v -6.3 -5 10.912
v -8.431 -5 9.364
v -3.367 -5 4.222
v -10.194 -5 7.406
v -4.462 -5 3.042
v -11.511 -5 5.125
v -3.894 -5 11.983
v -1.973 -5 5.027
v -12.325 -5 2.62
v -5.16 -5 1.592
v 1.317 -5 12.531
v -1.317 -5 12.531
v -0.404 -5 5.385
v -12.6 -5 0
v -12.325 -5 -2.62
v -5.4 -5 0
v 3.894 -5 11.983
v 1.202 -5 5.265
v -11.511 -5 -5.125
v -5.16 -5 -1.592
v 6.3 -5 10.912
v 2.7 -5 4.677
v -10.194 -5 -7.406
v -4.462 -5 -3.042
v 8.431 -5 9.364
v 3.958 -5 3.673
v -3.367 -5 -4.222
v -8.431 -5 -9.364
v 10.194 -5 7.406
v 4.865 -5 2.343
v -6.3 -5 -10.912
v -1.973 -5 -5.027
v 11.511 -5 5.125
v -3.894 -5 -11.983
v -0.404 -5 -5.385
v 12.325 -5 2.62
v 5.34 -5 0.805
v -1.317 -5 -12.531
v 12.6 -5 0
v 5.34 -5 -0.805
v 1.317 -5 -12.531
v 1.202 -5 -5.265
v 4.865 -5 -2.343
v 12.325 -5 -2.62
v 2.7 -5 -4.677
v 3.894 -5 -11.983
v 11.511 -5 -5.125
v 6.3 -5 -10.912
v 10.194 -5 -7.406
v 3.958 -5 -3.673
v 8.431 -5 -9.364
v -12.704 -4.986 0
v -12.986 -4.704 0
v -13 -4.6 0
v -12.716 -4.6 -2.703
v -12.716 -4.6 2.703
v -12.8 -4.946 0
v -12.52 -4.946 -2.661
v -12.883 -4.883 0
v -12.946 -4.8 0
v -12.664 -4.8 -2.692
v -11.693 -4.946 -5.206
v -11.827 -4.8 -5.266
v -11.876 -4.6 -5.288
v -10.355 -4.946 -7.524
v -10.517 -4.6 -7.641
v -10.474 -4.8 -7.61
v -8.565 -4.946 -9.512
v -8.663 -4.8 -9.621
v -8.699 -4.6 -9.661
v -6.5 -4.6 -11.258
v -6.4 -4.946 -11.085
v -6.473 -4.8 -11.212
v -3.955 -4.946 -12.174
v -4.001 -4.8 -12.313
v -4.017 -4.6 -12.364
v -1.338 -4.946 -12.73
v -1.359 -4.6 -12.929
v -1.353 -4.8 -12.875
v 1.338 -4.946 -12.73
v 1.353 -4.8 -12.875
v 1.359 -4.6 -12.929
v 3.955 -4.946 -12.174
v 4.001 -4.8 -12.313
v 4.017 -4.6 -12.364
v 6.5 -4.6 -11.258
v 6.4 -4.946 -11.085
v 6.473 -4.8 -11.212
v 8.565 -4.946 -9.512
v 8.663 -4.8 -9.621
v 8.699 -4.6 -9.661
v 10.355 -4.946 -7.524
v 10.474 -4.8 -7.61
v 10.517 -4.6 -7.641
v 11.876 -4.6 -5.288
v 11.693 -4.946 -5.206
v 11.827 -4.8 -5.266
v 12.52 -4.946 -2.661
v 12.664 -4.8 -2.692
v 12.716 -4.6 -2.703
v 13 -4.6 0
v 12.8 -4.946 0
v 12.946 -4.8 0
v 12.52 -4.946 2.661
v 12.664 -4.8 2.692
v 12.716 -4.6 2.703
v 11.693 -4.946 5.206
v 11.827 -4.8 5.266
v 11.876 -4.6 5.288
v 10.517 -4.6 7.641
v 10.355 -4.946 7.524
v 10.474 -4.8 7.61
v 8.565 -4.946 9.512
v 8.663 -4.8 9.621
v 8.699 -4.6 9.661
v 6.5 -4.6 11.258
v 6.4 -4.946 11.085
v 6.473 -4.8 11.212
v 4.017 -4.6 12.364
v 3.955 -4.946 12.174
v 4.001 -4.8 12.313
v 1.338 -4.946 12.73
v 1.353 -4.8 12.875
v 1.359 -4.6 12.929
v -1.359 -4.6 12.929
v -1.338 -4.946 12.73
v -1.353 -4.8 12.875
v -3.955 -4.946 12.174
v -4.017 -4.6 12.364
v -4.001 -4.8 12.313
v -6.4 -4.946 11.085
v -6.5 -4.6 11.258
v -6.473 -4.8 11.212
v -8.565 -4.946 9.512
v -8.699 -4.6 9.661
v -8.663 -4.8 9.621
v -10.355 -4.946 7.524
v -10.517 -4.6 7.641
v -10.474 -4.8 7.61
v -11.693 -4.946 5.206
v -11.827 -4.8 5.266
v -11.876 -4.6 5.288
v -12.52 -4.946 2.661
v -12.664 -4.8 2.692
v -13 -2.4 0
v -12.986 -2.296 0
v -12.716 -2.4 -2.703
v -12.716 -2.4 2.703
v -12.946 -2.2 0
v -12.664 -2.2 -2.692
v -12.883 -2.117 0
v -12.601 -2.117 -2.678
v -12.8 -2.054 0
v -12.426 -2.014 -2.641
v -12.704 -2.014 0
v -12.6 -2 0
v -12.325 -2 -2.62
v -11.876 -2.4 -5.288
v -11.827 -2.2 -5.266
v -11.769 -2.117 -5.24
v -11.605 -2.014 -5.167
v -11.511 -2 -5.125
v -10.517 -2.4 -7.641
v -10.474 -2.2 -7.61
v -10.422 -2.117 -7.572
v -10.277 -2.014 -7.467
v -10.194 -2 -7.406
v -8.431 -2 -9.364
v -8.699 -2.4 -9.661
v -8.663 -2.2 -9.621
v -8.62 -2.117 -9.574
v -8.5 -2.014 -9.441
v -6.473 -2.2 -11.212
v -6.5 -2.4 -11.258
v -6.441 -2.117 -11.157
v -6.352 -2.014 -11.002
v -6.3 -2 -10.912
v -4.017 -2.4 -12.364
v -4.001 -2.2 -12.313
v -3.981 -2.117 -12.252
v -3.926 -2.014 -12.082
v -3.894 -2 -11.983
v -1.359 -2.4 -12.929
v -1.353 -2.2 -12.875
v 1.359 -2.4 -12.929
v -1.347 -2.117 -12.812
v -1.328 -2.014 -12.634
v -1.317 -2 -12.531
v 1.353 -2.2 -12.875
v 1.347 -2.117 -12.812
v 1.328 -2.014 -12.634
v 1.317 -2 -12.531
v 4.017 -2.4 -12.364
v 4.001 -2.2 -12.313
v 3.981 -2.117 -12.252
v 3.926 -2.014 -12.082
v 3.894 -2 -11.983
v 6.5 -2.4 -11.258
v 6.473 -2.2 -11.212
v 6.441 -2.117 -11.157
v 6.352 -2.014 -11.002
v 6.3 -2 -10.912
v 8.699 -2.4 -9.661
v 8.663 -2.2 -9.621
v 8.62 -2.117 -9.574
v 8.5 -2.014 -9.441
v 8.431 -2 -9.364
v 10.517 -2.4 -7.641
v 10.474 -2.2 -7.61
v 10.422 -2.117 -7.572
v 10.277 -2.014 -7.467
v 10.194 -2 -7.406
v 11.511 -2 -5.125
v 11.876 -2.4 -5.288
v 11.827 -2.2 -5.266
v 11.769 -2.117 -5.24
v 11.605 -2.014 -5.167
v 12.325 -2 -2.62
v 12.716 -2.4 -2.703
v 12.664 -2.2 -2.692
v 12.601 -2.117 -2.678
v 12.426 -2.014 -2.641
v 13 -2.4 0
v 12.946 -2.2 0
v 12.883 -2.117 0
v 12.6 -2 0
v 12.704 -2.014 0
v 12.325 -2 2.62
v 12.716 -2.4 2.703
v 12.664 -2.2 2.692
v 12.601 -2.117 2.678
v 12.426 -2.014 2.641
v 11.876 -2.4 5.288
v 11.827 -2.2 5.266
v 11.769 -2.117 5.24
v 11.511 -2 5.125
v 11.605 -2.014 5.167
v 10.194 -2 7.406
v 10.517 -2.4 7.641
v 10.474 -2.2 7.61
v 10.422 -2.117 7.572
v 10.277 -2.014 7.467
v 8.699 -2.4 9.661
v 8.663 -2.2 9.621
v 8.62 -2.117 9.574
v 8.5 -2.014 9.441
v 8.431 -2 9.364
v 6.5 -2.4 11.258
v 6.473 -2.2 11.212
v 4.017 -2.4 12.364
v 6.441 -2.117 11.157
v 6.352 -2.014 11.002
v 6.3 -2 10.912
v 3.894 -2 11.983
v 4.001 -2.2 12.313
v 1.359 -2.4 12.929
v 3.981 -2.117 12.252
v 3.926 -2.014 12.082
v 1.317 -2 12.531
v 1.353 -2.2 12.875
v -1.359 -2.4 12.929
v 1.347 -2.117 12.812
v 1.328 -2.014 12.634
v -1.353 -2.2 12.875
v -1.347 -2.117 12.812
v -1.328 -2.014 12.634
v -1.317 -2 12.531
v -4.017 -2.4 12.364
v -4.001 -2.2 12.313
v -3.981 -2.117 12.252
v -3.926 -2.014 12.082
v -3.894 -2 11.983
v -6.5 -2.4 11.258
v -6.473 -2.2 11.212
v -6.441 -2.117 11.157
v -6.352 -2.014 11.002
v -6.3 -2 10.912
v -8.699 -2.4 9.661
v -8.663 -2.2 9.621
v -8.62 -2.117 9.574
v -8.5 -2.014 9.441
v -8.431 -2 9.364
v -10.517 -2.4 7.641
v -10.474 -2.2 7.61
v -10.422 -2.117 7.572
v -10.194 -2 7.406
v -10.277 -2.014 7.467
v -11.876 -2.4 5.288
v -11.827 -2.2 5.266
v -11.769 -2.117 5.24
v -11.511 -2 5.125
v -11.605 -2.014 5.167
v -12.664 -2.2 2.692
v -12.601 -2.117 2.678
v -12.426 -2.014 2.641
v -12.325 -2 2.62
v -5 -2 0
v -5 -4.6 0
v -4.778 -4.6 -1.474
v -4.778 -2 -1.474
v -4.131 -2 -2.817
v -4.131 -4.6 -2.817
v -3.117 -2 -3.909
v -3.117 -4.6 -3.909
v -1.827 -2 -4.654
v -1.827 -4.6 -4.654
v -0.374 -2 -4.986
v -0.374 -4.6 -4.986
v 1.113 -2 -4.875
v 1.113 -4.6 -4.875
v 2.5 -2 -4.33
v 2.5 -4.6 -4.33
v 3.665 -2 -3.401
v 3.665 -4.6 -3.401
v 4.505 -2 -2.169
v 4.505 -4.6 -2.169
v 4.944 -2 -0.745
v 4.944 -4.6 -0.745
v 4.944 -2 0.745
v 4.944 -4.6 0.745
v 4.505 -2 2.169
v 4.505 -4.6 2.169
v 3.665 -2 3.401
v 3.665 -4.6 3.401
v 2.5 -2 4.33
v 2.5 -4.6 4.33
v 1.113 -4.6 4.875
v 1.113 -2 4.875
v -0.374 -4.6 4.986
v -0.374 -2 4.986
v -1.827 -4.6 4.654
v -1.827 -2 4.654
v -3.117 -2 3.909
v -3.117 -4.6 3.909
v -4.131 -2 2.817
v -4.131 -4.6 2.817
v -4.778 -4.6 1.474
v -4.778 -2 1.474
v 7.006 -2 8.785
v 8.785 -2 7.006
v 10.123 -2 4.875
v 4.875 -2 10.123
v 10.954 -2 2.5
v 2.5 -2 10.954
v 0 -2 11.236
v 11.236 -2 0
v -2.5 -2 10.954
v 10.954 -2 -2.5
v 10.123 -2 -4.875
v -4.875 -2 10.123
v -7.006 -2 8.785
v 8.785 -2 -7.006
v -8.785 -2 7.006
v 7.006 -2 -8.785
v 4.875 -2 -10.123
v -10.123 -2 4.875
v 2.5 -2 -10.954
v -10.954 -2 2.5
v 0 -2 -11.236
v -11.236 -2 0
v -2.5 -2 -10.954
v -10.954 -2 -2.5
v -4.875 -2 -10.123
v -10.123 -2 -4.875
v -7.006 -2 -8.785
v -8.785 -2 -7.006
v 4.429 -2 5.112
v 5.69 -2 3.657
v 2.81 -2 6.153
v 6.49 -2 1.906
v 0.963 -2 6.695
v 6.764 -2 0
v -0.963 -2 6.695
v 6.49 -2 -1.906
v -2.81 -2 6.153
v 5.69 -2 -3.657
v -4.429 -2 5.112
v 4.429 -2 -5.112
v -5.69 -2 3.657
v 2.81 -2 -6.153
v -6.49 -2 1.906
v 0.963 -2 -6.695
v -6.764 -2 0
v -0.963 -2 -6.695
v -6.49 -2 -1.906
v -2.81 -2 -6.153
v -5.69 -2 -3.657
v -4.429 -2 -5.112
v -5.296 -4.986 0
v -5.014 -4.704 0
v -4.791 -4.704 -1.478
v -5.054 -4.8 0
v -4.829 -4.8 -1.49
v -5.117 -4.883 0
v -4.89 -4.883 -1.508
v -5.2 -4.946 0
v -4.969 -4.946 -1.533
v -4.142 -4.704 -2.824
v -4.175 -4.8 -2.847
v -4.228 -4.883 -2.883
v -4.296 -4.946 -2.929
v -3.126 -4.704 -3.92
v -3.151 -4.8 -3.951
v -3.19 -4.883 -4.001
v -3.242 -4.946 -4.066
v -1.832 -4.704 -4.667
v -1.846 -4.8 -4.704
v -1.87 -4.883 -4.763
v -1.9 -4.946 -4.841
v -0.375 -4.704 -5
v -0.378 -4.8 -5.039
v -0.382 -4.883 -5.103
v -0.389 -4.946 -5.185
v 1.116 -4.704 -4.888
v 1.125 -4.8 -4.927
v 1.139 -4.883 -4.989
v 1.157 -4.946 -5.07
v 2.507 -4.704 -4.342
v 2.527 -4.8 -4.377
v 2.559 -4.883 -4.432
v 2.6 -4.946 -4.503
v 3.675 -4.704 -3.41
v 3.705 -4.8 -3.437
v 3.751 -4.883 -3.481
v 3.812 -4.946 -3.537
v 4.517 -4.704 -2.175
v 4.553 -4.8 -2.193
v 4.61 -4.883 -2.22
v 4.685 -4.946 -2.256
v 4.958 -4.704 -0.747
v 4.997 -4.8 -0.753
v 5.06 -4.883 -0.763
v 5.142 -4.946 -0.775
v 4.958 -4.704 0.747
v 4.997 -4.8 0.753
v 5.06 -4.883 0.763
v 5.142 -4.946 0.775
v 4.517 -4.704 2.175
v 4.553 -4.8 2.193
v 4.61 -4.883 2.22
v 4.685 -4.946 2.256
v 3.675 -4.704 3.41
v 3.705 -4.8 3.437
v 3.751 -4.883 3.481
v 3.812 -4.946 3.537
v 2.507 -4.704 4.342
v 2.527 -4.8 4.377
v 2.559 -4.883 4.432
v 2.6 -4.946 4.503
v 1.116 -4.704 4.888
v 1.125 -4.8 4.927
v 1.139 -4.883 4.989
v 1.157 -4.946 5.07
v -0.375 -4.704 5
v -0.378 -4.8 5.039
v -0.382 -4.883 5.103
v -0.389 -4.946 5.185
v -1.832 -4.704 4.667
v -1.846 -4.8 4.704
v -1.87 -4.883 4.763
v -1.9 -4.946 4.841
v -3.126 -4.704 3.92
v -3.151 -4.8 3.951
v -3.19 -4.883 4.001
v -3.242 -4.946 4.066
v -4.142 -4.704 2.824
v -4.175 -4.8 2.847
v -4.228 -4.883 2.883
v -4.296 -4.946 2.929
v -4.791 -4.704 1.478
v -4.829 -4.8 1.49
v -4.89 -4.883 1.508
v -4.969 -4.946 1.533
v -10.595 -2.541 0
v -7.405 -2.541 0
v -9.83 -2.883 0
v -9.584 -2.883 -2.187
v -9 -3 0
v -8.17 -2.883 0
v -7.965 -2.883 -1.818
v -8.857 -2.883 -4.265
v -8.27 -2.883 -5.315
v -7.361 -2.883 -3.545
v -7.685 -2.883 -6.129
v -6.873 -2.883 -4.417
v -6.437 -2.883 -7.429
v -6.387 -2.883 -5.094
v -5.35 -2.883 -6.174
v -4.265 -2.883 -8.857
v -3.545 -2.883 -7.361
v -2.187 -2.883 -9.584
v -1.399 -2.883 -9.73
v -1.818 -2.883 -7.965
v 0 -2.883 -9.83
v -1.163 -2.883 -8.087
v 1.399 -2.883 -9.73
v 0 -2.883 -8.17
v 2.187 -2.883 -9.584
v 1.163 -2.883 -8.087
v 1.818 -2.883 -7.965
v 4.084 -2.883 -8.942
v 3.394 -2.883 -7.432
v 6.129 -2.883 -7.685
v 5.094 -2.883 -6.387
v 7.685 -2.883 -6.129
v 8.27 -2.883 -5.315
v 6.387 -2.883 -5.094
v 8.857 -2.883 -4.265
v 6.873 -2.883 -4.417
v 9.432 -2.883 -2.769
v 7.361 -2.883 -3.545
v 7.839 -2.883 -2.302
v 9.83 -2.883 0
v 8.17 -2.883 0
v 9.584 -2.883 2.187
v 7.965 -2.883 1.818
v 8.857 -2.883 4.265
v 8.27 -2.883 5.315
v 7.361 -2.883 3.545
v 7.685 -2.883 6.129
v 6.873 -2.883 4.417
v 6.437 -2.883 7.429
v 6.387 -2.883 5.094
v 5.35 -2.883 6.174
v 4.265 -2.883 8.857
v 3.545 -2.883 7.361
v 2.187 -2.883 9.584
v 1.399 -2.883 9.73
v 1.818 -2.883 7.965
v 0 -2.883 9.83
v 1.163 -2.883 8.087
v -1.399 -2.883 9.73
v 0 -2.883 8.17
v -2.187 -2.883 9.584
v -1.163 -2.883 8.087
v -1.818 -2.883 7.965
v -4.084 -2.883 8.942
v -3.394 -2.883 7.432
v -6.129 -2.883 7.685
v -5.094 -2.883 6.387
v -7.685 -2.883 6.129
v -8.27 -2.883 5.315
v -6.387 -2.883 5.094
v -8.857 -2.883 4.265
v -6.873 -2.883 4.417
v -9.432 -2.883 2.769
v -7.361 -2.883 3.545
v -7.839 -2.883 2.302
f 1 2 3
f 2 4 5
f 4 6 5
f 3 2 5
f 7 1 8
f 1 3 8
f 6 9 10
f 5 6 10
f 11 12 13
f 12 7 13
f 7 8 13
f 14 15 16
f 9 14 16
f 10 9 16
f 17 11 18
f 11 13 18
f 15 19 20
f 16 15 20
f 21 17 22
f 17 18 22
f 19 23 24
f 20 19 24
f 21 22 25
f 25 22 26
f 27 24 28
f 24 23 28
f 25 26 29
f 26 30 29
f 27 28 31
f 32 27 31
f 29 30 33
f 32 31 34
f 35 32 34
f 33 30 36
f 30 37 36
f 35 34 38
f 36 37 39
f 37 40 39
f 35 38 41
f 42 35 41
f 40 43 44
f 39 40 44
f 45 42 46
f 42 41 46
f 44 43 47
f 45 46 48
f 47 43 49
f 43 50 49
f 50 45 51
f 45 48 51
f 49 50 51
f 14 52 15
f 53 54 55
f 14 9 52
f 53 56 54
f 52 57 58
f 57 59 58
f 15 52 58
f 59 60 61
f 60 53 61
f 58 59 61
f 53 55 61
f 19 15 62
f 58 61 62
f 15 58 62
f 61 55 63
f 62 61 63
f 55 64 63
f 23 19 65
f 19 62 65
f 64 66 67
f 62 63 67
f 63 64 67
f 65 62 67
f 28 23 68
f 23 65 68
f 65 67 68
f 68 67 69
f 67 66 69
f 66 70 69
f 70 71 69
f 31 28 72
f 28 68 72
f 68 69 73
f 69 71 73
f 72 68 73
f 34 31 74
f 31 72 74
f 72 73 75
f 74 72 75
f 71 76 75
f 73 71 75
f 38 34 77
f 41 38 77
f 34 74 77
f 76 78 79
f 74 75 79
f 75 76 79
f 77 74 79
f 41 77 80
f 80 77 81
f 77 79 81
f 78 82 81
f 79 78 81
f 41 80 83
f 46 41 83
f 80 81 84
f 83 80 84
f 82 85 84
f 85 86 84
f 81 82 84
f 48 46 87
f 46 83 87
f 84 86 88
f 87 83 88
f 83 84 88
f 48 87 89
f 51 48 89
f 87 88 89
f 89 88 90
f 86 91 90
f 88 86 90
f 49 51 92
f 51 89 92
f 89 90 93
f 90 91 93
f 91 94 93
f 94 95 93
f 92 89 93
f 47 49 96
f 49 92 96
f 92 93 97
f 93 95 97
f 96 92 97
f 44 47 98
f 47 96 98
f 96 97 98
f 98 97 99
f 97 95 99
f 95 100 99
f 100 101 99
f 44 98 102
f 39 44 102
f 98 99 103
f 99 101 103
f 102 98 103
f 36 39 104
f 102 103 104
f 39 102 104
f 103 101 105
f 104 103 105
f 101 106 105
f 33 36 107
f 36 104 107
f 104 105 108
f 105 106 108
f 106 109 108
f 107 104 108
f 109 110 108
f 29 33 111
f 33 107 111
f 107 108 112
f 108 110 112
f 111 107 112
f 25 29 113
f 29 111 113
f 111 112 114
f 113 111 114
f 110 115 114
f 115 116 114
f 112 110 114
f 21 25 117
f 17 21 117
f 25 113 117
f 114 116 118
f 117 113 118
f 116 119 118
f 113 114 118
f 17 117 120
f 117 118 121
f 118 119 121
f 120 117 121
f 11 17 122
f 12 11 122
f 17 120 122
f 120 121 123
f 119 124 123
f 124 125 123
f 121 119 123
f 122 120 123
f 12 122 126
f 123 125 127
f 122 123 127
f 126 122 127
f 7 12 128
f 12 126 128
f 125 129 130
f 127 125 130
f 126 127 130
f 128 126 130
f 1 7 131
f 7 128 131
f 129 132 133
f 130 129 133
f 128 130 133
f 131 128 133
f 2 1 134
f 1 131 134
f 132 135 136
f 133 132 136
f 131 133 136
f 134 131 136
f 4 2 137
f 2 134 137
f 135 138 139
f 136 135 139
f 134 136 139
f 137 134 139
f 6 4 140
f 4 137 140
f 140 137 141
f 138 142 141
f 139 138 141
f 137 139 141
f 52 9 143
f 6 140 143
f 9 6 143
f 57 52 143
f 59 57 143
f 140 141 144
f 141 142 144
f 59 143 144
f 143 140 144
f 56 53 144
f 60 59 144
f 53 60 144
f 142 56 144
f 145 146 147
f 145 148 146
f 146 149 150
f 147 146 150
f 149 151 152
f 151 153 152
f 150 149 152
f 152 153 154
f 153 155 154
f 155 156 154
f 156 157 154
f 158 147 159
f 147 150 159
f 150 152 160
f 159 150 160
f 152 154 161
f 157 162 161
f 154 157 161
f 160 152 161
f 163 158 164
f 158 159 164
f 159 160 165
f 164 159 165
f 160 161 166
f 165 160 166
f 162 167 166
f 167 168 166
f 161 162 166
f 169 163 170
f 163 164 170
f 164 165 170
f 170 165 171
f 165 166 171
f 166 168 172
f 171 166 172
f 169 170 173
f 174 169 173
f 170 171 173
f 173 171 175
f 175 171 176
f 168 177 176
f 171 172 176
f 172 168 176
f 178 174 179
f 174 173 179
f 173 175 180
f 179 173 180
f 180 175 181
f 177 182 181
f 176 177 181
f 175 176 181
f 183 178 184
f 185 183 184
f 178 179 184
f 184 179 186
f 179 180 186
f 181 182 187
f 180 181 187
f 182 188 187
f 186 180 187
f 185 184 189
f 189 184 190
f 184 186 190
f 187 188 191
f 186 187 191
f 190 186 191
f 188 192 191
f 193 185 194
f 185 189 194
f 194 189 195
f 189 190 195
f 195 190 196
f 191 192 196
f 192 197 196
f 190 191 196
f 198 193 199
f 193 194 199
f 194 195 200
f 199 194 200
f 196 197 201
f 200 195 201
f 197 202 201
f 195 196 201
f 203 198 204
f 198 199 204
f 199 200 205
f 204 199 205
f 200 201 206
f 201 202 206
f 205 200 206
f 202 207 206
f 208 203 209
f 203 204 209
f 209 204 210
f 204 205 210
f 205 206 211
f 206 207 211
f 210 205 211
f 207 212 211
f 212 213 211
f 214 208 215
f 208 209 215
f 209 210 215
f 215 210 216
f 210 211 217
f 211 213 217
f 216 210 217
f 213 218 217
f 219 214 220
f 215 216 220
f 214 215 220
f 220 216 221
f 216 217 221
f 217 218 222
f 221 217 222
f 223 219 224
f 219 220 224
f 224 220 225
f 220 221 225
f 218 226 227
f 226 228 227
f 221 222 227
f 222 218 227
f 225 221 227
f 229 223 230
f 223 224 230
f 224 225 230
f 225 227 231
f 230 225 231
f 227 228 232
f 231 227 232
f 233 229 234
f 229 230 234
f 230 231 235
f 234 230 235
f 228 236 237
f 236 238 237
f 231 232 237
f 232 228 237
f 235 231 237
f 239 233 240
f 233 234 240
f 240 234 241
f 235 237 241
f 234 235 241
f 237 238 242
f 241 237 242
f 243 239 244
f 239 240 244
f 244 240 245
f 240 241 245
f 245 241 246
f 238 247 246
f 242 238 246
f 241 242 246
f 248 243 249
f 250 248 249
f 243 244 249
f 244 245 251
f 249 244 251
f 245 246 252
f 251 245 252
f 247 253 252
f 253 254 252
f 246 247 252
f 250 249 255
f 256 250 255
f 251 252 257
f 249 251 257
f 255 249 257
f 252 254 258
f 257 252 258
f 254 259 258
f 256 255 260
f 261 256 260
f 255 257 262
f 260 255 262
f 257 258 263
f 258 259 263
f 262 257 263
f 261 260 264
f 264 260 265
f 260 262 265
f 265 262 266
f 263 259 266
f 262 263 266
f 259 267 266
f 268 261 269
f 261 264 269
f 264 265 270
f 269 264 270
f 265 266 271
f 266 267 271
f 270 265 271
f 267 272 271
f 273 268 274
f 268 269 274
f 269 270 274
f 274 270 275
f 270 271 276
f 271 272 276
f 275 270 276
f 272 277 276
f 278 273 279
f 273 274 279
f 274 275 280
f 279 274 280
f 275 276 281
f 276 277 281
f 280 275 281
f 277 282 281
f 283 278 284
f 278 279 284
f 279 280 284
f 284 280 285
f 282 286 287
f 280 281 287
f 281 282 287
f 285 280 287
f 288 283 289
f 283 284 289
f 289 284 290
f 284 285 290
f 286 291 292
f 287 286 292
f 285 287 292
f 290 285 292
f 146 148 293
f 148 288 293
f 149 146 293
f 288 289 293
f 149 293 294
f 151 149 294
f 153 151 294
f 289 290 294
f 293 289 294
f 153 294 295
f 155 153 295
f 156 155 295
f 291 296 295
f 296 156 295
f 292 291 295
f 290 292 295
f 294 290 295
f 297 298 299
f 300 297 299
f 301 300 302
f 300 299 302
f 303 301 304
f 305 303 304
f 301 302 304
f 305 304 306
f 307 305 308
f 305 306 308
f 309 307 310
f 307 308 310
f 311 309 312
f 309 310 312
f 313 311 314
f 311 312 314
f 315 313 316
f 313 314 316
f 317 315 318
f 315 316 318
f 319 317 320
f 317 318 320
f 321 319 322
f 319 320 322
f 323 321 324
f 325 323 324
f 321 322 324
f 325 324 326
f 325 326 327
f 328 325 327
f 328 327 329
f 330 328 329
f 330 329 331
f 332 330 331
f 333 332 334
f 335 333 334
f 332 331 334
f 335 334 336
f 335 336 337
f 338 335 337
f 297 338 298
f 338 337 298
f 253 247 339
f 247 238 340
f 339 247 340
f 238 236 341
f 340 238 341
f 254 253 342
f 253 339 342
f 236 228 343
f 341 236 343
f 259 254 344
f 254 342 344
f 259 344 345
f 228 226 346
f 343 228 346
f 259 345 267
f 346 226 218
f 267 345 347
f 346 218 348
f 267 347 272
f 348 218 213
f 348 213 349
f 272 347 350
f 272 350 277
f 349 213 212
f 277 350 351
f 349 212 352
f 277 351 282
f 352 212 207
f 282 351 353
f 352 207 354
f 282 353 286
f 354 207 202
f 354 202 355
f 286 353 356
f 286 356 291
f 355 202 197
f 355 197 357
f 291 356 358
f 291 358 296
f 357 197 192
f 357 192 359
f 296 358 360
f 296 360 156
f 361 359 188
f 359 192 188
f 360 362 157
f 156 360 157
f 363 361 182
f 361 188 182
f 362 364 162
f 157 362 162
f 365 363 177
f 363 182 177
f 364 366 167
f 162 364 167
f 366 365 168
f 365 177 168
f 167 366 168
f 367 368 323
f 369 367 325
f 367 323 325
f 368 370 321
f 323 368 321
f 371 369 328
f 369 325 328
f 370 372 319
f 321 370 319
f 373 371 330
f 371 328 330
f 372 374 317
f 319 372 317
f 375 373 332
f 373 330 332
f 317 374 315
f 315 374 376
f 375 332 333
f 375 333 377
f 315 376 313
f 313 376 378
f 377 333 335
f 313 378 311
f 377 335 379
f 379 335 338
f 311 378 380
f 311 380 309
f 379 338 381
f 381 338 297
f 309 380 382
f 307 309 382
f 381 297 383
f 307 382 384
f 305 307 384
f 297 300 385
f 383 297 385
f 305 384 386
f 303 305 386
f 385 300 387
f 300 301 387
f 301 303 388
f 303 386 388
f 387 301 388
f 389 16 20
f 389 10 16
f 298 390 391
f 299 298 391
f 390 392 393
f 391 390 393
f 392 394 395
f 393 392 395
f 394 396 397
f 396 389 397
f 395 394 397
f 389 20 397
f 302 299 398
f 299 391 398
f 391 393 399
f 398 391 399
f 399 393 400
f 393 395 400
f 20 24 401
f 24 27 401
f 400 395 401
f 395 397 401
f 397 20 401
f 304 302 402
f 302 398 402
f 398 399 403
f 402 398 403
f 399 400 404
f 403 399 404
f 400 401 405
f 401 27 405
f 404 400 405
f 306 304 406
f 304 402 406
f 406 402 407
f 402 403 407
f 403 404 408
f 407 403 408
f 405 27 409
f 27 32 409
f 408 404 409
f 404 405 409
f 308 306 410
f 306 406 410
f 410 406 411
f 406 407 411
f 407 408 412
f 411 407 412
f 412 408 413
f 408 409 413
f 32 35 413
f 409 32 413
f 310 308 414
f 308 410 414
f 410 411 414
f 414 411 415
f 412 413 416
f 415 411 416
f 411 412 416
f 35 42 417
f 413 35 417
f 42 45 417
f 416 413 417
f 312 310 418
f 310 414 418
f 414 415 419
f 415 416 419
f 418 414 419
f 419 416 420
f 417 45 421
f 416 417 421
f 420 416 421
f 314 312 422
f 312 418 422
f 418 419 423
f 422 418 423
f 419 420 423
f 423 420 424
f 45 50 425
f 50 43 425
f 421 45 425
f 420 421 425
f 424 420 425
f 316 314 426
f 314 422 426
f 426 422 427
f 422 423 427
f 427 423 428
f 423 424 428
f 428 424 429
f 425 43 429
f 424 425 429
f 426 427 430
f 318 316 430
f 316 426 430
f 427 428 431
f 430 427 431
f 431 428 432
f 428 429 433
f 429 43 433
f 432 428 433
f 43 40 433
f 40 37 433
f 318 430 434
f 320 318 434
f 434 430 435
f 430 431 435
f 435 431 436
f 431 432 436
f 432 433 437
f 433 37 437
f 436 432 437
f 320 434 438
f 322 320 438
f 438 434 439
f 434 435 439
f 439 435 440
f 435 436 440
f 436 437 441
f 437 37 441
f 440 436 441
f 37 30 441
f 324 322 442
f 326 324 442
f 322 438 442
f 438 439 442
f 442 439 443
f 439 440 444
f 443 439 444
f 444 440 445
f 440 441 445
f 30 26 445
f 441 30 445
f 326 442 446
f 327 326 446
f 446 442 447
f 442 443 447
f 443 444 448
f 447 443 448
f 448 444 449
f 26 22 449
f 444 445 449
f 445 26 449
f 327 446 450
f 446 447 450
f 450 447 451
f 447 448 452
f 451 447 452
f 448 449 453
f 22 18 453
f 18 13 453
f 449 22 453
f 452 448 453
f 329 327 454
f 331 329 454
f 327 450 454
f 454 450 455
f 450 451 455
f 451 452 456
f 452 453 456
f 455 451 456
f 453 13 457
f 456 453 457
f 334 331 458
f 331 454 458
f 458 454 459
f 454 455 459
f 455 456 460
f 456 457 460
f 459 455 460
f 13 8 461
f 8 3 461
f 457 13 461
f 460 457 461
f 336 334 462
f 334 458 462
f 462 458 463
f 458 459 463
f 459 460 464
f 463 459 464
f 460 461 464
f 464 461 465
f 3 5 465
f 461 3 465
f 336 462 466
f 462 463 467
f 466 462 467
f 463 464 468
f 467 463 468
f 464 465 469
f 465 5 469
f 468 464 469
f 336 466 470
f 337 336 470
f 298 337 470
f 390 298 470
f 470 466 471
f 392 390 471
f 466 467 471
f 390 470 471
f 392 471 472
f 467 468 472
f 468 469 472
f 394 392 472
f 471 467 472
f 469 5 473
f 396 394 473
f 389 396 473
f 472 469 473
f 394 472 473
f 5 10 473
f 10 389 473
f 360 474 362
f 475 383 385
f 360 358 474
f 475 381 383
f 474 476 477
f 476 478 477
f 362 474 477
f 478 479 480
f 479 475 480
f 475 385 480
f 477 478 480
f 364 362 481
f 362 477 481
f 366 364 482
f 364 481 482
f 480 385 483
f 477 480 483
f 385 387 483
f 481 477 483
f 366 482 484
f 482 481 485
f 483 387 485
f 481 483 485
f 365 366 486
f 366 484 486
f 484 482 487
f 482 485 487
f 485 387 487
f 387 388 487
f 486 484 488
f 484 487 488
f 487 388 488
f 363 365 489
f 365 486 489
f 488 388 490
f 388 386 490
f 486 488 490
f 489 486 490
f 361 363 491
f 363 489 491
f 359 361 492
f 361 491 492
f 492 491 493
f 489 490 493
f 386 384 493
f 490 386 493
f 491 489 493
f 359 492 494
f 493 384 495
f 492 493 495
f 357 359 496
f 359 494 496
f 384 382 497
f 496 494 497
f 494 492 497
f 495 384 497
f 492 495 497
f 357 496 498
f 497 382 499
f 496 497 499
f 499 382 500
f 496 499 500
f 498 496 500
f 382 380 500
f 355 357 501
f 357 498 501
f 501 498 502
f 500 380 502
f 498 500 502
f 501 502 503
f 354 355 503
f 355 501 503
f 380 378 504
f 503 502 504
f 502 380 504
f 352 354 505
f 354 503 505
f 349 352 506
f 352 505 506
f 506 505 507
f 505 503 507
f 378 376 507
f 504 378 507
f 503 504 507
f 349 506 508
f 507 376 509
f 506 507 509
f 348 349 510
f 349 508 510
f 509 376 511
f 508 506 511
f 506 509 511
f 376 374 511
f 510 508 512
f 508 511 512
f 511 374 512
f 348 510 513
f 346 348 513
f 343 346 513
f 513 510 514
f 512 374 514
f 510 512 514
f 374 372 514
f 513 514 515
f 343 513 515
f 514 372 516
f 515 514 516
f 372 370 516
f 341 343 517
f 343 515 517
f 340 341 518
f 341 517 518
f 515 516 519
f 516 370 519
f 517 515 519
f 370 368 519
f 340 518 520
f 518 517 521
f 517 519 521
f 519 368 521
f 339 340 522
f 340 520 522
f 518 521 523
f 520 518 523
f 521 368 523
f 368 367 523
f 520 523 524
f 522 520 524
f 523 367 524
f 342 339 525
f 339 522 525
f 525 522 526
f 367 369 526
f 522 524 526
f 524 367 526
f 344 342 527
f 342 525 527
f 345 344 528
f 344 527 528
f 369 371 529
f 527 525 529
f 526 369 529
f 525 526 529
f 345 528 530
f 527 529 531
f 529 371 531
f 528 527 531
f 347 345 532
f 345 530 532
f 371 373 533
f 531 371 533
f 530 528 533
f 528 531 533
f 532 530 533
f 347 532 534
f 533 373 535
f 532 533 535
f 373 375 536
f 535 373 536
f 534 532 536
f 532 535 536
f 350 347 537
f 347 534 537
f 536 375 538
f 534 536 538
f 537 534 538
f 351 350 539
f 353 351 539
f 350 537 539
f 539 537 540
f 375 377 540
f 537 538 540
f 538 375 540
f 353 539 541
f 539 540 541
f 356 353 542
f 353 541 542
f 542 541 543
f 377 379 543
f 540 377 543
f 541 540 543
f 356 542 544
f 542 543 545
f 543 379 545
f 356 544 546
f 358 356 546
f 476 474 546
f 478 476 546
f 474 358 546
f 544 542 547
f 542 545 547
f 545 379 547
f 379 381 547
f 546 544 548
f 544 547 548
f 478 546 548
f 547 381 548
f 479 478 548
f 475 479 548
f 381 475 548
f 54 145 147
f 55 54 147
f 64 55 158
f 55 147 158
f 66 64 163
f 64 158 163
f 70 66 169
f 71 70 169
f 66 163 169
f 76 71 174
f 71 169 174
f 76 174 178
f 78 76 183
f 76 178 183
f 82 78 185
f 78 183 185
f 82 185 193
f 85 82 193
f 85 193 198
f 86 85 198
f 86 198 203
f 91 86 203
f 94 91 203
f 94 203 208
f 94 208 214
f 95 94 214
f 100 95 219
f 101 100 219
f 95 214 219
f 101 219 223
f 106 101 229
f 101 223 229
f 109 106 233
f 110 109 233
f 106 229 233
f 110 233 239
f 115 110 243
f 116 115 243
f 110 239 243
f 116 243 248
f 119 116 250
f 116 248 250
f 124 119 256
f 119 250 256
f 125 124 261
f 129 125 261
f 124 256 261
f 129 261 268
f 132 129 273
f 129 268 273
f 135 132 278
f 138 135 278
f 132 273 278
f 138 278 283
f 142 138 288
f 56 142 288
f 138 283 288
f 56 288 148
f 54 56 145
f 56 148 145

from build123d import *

# Parameters (mm, degrees)
FILLET1_R = 0.4


with BuildPart() as part:
    # Sketch1 → Revolve1 (revolve)
    with BuildSketch(Plane.XY):
        with BuildLine():
            Line((5, -2), (5, -5))
            Line((5, -5), (13, -5))
            Line((13, -5), (13, -2))
            Line((13, -2), (11.236067977, -2))
            ThreePointArc((11.236067977, -2), (9, -3), (6.763932023, -2))
            Line((6.763932023, -2), (5, -2))
        make_face()
    revolve(axis=Axis((0, 5, 0), (0, -1, 0)))

    # Fillet1
    fillet1_edges = [part.edges().sort_by_distance(p)[0] for p in [
        (-13, -5, 0),
        (-13, -2, 0),
        (-5, -5, 0),
    ]]
    fillet(fillet1_edges, radius=FILLET1_R)


solid = part.part
